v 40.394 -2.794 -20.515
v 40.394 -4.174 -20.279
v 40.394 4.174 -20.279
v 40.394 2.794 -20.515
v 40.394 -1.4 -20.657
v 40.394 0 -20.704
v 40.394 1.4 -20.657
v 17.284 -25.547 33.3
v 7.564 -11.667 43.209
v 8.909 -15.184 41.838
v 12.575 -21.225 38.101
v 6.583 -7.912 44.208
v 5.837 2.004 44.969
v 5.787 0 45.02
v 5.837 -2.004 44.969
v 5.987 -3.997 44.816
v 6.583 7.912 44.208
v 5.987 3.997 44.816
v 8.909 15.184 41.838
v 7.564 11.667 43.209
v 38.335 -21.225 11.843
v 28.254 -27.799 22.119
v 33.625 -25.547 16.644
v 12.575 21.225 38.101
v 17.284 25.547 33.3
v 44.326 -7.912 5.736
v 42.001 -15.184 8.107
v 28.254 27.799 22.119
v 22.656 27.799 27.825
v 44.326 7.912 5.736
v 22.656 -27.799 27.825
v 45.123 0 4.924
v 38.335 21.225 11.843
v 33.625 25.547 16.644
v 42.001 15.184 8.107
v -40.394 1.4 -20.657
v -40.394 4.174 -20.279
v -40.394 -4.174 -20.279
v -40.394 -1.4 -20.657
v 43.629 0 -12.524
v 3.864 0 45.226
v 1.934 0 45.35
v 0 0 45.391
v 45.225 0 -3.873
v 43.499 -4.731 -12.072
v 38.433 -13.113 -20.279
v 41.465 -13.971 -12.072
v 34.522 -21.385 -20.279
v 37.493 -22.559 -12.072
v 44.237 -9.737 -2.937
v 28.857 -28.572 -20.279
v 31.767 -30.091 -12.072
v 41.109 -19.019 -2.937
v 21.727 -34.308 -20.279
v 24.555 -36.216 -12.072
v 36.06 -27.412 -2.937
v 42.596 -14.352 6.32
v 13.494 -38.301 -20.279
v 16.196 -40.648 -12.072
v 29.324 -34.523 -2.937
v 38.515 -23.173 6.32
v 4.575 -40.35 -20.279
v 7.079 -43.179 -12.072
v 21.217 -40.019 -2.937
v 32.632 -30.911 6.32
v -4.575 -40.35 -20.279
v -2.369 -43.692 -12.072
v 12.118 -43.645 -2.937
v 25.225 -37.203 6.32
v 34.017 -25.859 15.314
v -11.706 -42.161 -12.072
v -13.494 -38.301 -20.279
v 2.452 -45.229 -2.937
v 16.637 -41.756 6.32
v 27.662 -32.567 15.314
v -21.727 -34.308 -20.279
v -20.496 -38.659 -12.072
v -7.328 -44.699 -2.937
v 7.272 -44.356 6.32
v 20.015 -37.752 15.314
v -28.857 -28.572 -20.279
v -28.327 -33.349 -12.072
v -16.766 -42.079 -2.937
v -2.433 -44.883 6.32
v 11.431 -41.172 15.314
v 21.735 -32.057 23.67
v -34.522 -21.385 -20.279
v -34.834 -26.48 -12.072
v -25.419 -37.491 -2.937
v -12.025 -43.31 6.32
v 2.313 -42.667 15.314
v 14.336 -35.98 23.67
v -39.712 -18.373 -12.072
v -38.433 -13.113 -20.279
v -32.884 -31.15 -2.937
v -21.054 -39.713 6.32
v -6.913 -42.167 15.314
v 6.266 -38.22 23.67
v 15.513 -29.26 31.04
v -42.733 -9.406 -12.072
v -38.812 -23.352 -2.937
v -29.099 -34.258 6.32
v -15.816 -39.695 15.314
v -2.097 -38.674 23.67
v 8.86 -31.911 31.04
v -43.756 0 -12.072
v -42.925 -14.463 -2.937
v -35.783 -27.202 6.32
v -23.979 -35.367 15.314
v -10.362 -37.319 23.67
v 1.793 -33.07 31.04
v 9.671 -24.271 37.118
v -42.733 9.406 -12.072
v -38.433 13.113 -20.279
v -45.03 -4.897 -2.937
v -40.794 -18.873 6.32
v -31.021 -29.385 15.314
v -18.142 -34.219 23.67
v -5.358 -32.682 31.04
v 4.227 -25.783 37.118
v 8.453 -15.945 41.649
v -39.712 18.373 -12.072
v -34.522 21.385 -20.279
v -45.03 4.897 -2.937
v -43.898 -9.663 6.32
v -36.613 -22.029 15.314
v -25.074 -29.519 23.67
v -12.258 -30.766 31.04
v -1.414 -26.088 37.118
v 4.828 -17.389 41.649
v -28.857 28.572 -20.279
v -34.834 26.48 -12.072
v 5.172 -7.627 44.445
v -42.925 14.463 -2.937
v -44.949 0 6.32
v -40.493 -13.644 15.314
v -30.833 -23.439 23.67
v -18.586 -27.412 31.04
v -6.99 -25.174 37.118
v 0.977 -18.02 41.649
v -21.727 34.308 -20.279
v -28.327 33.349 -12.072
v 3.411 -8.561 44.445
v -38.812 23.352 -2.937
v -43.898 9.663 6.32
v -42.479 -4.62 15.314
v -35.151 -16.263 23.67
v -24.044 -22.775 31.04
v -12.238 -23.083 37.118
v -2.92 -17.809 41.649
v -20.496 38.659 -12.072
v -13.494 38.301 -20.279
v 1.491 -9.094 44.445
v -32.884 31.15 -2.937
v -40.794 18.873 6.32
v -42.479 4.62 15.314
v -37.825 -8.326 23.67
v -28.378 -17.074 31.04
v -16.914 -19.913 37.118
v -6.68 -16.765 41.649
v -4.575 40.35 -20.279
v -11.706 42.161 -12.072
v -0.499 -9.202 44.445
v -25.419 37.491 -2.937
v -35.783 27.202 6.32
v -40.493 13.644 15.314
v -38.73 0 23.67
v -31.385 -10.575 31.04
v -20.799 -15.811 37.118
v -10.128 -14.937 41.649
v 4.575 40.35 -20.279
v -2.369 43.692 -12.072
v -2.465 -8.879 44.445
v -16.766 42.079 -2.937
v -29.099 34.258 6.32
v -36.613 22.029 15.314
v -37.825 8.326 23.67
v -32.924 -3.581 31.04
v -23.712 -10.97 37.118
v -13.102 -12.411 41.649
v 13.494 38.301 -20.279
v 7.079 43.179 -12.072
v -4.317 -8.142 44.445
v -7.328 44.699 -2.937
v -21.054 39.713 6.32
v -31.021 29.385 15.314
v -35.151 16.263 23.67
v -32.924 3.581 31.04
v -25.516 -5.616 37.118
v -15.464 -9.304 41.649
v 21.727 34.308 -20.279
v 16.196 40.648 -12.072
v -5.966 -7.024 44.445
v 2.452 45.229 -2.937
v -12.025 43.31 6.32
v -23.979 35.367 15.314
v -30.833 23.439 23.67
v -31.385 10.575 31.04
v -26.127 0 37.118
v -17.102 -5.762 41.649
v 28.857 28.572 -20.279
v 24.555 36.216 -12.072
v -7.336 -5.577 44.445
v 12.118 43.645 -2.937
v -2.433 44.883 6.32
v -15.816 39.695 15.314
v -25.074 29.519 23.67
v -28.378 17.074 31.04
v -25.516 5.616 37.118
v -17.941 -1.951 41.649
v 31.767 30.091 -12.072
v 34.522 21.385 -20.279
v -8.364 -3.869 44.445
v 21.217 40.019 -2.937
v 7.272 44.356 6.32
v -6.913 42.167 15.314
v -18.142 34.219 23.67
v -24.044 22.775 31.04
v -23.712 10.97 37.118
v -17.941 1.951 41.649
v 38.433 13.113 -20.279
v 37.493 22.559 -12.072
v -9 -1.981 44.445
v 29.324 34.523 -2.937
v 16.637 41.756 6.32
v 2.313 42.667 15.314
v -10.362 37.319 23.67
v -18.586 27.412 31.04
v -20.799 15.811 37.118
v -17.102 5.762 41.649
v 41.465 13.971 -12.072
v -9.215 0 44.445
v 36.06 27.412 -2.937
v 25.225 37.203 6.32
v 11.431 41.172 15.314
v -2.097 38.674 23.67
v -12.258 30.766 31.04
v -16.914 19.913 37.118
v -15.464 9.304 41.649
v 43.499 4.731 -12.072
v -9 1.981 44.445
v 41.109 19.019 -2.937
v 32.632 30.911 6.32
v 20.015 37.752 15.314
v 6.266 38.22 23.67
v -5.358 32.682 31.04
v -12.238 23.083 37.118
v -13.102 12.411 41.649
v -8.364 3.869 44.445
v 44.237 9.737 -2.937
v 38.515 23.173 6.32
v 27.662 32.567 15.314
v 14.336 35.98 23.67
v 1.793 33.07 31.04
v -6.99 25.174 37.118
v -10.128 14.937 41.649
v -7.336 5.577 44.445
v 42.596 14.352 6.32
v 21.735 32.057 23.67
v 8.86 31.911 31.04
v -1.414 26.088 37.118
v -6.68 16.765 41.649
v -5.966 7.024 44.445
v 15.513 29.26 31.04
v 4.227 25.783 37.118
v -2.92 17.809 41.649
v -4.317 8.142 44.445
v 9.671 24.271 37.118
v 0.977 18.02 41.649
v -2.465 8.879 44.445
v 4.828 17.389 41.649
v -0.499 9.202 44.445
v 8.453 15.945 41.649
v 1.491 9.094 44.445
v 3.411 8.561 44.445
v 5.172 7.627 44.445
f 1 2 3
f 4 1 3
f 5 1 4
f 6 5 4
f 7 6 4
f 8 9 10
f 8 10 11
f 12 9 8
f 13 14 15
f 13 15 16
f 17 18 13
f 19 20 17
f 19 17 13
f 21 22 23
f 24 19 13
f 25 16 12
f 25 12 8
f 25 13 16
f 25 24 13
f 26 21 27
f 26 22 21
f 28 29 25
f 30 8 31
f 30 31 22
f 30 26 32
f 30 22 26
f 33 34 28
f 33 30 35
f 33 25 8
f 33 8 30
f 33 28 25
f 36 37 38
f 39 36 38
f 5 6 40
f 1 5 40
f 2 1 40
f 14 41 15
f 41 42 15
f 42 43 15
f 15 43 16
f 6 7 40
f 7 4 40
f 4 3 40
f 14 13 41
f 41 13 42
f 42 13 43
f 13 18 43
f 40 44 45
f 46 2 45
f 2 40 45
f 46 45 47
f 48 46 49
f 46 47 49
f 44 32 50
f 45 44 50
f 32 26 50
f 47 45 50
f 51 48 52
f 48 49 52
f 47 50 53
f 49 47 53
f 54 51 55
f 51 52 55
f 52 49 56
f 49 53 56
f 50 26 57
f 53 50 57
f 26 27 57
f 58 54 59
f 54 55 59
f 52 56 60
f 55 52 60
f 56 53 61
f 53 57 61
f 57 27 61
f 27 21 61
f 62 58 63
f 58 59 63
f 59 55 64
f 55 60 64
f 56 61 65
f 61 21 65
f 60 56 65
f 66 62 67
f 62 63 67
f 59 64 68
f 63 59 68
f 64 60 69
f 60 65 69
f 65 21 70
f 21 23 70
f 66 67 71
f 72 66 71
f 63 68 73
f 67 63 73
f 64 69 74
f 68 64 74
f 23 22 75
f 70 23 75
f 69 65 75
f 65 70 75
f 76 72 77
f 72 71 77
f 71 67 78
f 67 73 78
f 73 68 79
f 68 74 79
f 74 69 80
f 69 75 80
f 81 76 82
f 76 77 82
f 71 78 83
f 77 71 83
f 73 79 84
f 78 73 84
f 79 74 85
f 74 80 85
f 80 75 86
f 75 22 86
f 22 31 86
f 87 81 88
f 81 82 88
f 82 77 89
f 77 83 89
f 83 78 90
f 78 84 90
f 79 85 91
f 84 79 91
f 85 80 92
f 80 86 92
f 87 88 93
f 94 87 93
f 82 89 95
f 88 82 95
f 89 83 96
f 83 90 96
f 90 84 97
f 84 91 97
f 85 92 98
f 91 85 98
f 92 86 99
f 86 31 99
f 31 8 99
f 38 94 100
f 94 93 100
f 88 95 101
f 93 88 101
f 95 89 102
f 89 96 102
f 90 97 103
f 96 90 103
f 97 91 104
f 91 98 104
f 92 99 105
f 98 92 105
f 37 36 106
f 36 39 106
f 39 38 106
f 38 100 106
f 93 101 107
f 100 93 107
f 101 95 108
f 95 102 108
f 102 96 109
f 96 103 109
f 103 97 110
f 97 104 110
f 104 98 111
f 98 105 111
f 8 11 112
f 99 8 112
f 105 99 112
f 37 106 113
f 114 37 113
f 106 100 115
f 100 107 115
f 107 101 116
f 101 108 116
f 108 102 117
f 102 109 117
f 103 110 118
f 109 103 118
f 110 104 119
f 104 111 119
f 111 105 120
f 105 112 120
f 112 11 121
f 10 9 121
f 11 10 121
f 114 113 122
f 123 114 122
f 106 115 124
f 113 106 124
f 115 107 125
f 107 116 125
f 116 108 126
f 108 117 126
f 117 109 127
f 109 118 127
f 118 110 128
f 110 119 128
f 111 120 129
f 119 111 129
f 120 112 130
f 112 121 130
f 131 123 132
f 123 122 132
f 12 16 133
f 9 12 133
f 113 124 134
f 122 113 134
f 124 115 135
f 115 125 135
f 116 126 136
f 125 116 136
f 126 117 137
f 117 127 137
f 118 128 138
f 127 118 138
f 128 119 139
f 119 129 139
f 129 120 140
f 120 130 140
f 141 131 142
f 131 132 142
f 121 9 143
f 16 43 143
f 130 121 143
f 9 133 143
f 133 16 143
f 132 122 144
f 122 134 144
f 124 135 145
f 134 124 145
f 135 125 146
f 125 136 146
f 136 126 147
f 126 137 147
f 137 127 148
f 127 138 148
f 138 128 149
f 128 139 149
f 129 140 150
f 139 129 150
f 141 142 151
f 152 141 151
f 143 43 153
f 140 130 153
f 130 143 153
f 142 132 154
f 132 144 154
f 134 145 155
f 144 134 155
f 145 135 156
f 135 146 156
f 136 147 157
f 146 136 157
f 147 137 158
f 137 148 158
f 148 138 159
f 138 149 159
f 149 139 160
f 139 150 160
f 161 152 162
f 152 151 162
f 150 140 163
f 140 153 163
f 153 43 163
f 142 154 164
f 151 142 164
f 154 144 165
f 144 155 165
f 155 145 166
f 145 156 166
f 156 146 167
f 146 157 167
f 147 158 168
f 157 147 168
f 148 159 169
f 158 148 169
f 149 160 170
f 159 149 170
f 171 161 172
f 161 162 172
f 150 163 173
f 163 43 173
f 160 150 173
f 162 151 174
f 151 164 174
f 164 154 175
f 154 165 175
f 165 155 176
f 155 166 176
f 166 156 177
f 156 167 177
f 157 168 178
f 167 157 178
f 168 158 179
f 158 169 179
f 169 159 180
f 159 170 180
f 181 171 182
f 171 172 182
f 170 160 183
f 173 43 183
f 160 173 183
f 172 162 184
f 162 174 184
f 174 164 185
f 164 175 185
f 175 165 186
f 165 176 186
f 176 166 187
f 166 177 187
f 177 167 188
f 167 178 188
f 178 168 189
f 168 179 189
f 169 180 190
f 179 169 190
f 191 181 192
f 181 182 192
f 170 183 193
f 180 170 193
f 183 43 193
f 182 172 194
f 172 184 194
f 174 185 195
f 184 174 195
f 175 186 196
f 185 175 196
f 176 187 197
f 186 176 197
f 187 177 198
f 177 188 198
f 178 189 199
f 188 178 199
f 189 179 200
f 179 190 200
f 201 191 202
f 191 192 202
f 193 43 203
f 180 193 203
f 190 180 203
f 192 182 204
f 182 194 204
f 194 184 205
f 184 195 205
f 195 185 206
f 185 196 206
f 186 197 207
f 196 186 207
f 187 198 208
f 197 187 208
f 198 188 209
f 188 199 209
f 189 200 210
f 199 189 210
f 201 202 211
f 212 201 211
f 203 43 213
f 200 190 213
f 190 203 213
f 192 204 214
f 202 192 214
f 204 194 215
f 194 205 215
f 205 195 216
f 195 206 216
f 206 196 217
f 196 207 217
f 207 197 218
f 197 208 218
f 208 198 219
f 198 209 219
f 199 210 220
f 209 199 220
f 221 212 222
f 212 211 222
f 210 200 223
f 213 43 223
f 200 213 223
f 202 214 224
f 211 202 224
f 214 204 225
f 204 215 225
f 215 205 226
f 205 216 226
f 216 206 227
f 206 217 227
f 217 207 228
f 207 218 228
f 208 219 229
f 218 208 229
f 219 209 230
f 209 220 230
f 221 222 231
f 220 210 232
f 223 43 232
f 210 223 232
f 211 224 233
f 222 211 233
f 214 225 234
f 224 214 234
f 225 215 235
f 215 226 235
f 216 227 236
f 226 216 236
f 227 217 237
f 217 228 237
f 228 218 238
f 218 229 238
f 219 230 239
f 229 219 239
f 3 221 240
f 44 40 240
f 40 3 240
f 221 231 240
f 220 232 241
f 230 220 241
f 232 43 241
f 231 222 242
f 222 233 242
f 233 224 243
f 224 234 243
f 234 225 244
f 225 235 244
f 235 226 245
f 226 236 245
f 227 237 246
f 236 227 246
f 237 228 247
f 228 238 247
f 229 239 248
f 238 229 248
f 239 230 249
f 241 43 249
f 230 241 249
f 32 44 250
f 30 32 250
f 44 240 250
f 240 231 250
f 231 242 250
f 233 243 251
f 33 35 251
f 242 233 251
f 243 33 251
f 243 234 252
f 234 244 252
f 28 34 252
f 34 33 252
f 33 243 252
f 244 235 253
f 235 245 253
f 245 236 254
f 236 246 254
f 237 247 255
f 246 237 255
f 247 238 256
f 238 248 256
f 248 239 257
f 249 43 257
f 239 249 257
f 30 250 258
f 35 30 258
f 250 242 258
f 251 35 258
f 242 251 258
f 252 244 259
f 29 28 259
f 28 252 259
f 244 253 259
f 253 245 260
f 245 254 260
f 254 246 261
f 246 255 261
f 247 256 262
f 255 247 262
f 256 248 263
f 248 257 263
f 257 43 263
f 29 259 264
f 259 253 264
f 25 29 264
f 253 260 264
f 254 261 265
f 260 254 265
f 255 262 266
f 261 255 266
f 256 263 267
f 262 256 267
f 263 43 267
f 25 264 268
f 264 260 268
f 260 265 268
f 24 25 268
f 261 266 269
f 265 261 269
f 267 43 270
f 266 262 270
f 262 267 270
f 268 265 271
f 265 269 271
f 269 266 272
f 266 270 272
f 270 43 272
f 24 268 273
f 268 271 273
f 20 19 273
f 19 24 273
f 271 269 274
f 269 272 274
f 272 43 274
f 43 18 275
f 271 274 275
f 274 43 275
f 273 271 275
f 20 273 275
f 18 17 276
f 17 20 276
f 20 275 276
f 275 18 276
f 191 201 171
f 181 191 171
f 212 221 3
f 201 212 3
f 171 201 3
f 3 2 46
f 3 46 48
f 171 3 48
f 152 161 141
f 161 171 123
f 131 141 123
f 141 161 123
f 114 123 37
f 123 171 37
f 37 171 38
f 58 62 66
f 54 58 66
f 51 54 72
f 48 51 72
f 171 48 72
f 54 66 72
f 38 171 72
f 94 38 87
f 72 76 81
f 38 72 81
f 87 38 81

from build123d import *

# Parameters (mm, degrees)
F4_DEPTH      = 45.391737605
F4_DEPTH_BACK = 45.391737605
F6_DEPTH      = 45.391737605
F7_DEPTH      = 45.391737605


with BuildPart() as f2:
    # F0 (on Front) → F2 (revolve)
    with BuildSketch(Plane.XZ):
        with BuildLine():
            Line((0, 45.390737605), (0, -45.390737605))
            ThreePointArc((0, -45.390737605), (45.390737605, 0), (0, 45.390737605))
        make_face()
    revolve(axis=Axis((0, 0, -0.1771636307), (0, 0, -1)))

    # F3 (on Front) → F4 (cut, two sides)
    with BuildSketch(Plane.XZ) as f4_sk:
        Polygon((0, -20.2791038901), (-40.3937026858, -20.2791038901), (-40.3937026858, -45.9680799395), (0, -45.9680799395), (40.3937026858, -45.9680799395), (40.3937026858, -20.2791038901), align=None)
    extrude(amount=-F4_DEPTH, mode=Mode.SUBTRACT)
    extrude(f4_sk.sketch, amount=F4_DEPTH_BACK, mode=Mode.SUBTRACT)

    # F5 (on Front) → F6 (cut, through all)
    with BuildSketch(Plane.XZ):
        Polygon((9.3581555411, 46.5339459479), (4.3016839772, 46.5339459479), (47.9137524962, 2.0791364368), (50.4419840872, 46.5339459479), align=None)
    extrude(amount=F6_DEPTH, mode=Mode.SUBTRACT)

    # F5 (on Front) → F7 (cut, through all)
    with BuildSketch(Plane.XZ):
        Polygon((9.3581555411, 46.5339459479), (4.3016839772, 46.5339459479), (47.9137524962, 2.0791364368), (50.4419840872, 46.5339459479), align=None)
    extrude(amount=-F7_DEPTH, mode=Mode.SUBTRACT)


solid = f2.part
